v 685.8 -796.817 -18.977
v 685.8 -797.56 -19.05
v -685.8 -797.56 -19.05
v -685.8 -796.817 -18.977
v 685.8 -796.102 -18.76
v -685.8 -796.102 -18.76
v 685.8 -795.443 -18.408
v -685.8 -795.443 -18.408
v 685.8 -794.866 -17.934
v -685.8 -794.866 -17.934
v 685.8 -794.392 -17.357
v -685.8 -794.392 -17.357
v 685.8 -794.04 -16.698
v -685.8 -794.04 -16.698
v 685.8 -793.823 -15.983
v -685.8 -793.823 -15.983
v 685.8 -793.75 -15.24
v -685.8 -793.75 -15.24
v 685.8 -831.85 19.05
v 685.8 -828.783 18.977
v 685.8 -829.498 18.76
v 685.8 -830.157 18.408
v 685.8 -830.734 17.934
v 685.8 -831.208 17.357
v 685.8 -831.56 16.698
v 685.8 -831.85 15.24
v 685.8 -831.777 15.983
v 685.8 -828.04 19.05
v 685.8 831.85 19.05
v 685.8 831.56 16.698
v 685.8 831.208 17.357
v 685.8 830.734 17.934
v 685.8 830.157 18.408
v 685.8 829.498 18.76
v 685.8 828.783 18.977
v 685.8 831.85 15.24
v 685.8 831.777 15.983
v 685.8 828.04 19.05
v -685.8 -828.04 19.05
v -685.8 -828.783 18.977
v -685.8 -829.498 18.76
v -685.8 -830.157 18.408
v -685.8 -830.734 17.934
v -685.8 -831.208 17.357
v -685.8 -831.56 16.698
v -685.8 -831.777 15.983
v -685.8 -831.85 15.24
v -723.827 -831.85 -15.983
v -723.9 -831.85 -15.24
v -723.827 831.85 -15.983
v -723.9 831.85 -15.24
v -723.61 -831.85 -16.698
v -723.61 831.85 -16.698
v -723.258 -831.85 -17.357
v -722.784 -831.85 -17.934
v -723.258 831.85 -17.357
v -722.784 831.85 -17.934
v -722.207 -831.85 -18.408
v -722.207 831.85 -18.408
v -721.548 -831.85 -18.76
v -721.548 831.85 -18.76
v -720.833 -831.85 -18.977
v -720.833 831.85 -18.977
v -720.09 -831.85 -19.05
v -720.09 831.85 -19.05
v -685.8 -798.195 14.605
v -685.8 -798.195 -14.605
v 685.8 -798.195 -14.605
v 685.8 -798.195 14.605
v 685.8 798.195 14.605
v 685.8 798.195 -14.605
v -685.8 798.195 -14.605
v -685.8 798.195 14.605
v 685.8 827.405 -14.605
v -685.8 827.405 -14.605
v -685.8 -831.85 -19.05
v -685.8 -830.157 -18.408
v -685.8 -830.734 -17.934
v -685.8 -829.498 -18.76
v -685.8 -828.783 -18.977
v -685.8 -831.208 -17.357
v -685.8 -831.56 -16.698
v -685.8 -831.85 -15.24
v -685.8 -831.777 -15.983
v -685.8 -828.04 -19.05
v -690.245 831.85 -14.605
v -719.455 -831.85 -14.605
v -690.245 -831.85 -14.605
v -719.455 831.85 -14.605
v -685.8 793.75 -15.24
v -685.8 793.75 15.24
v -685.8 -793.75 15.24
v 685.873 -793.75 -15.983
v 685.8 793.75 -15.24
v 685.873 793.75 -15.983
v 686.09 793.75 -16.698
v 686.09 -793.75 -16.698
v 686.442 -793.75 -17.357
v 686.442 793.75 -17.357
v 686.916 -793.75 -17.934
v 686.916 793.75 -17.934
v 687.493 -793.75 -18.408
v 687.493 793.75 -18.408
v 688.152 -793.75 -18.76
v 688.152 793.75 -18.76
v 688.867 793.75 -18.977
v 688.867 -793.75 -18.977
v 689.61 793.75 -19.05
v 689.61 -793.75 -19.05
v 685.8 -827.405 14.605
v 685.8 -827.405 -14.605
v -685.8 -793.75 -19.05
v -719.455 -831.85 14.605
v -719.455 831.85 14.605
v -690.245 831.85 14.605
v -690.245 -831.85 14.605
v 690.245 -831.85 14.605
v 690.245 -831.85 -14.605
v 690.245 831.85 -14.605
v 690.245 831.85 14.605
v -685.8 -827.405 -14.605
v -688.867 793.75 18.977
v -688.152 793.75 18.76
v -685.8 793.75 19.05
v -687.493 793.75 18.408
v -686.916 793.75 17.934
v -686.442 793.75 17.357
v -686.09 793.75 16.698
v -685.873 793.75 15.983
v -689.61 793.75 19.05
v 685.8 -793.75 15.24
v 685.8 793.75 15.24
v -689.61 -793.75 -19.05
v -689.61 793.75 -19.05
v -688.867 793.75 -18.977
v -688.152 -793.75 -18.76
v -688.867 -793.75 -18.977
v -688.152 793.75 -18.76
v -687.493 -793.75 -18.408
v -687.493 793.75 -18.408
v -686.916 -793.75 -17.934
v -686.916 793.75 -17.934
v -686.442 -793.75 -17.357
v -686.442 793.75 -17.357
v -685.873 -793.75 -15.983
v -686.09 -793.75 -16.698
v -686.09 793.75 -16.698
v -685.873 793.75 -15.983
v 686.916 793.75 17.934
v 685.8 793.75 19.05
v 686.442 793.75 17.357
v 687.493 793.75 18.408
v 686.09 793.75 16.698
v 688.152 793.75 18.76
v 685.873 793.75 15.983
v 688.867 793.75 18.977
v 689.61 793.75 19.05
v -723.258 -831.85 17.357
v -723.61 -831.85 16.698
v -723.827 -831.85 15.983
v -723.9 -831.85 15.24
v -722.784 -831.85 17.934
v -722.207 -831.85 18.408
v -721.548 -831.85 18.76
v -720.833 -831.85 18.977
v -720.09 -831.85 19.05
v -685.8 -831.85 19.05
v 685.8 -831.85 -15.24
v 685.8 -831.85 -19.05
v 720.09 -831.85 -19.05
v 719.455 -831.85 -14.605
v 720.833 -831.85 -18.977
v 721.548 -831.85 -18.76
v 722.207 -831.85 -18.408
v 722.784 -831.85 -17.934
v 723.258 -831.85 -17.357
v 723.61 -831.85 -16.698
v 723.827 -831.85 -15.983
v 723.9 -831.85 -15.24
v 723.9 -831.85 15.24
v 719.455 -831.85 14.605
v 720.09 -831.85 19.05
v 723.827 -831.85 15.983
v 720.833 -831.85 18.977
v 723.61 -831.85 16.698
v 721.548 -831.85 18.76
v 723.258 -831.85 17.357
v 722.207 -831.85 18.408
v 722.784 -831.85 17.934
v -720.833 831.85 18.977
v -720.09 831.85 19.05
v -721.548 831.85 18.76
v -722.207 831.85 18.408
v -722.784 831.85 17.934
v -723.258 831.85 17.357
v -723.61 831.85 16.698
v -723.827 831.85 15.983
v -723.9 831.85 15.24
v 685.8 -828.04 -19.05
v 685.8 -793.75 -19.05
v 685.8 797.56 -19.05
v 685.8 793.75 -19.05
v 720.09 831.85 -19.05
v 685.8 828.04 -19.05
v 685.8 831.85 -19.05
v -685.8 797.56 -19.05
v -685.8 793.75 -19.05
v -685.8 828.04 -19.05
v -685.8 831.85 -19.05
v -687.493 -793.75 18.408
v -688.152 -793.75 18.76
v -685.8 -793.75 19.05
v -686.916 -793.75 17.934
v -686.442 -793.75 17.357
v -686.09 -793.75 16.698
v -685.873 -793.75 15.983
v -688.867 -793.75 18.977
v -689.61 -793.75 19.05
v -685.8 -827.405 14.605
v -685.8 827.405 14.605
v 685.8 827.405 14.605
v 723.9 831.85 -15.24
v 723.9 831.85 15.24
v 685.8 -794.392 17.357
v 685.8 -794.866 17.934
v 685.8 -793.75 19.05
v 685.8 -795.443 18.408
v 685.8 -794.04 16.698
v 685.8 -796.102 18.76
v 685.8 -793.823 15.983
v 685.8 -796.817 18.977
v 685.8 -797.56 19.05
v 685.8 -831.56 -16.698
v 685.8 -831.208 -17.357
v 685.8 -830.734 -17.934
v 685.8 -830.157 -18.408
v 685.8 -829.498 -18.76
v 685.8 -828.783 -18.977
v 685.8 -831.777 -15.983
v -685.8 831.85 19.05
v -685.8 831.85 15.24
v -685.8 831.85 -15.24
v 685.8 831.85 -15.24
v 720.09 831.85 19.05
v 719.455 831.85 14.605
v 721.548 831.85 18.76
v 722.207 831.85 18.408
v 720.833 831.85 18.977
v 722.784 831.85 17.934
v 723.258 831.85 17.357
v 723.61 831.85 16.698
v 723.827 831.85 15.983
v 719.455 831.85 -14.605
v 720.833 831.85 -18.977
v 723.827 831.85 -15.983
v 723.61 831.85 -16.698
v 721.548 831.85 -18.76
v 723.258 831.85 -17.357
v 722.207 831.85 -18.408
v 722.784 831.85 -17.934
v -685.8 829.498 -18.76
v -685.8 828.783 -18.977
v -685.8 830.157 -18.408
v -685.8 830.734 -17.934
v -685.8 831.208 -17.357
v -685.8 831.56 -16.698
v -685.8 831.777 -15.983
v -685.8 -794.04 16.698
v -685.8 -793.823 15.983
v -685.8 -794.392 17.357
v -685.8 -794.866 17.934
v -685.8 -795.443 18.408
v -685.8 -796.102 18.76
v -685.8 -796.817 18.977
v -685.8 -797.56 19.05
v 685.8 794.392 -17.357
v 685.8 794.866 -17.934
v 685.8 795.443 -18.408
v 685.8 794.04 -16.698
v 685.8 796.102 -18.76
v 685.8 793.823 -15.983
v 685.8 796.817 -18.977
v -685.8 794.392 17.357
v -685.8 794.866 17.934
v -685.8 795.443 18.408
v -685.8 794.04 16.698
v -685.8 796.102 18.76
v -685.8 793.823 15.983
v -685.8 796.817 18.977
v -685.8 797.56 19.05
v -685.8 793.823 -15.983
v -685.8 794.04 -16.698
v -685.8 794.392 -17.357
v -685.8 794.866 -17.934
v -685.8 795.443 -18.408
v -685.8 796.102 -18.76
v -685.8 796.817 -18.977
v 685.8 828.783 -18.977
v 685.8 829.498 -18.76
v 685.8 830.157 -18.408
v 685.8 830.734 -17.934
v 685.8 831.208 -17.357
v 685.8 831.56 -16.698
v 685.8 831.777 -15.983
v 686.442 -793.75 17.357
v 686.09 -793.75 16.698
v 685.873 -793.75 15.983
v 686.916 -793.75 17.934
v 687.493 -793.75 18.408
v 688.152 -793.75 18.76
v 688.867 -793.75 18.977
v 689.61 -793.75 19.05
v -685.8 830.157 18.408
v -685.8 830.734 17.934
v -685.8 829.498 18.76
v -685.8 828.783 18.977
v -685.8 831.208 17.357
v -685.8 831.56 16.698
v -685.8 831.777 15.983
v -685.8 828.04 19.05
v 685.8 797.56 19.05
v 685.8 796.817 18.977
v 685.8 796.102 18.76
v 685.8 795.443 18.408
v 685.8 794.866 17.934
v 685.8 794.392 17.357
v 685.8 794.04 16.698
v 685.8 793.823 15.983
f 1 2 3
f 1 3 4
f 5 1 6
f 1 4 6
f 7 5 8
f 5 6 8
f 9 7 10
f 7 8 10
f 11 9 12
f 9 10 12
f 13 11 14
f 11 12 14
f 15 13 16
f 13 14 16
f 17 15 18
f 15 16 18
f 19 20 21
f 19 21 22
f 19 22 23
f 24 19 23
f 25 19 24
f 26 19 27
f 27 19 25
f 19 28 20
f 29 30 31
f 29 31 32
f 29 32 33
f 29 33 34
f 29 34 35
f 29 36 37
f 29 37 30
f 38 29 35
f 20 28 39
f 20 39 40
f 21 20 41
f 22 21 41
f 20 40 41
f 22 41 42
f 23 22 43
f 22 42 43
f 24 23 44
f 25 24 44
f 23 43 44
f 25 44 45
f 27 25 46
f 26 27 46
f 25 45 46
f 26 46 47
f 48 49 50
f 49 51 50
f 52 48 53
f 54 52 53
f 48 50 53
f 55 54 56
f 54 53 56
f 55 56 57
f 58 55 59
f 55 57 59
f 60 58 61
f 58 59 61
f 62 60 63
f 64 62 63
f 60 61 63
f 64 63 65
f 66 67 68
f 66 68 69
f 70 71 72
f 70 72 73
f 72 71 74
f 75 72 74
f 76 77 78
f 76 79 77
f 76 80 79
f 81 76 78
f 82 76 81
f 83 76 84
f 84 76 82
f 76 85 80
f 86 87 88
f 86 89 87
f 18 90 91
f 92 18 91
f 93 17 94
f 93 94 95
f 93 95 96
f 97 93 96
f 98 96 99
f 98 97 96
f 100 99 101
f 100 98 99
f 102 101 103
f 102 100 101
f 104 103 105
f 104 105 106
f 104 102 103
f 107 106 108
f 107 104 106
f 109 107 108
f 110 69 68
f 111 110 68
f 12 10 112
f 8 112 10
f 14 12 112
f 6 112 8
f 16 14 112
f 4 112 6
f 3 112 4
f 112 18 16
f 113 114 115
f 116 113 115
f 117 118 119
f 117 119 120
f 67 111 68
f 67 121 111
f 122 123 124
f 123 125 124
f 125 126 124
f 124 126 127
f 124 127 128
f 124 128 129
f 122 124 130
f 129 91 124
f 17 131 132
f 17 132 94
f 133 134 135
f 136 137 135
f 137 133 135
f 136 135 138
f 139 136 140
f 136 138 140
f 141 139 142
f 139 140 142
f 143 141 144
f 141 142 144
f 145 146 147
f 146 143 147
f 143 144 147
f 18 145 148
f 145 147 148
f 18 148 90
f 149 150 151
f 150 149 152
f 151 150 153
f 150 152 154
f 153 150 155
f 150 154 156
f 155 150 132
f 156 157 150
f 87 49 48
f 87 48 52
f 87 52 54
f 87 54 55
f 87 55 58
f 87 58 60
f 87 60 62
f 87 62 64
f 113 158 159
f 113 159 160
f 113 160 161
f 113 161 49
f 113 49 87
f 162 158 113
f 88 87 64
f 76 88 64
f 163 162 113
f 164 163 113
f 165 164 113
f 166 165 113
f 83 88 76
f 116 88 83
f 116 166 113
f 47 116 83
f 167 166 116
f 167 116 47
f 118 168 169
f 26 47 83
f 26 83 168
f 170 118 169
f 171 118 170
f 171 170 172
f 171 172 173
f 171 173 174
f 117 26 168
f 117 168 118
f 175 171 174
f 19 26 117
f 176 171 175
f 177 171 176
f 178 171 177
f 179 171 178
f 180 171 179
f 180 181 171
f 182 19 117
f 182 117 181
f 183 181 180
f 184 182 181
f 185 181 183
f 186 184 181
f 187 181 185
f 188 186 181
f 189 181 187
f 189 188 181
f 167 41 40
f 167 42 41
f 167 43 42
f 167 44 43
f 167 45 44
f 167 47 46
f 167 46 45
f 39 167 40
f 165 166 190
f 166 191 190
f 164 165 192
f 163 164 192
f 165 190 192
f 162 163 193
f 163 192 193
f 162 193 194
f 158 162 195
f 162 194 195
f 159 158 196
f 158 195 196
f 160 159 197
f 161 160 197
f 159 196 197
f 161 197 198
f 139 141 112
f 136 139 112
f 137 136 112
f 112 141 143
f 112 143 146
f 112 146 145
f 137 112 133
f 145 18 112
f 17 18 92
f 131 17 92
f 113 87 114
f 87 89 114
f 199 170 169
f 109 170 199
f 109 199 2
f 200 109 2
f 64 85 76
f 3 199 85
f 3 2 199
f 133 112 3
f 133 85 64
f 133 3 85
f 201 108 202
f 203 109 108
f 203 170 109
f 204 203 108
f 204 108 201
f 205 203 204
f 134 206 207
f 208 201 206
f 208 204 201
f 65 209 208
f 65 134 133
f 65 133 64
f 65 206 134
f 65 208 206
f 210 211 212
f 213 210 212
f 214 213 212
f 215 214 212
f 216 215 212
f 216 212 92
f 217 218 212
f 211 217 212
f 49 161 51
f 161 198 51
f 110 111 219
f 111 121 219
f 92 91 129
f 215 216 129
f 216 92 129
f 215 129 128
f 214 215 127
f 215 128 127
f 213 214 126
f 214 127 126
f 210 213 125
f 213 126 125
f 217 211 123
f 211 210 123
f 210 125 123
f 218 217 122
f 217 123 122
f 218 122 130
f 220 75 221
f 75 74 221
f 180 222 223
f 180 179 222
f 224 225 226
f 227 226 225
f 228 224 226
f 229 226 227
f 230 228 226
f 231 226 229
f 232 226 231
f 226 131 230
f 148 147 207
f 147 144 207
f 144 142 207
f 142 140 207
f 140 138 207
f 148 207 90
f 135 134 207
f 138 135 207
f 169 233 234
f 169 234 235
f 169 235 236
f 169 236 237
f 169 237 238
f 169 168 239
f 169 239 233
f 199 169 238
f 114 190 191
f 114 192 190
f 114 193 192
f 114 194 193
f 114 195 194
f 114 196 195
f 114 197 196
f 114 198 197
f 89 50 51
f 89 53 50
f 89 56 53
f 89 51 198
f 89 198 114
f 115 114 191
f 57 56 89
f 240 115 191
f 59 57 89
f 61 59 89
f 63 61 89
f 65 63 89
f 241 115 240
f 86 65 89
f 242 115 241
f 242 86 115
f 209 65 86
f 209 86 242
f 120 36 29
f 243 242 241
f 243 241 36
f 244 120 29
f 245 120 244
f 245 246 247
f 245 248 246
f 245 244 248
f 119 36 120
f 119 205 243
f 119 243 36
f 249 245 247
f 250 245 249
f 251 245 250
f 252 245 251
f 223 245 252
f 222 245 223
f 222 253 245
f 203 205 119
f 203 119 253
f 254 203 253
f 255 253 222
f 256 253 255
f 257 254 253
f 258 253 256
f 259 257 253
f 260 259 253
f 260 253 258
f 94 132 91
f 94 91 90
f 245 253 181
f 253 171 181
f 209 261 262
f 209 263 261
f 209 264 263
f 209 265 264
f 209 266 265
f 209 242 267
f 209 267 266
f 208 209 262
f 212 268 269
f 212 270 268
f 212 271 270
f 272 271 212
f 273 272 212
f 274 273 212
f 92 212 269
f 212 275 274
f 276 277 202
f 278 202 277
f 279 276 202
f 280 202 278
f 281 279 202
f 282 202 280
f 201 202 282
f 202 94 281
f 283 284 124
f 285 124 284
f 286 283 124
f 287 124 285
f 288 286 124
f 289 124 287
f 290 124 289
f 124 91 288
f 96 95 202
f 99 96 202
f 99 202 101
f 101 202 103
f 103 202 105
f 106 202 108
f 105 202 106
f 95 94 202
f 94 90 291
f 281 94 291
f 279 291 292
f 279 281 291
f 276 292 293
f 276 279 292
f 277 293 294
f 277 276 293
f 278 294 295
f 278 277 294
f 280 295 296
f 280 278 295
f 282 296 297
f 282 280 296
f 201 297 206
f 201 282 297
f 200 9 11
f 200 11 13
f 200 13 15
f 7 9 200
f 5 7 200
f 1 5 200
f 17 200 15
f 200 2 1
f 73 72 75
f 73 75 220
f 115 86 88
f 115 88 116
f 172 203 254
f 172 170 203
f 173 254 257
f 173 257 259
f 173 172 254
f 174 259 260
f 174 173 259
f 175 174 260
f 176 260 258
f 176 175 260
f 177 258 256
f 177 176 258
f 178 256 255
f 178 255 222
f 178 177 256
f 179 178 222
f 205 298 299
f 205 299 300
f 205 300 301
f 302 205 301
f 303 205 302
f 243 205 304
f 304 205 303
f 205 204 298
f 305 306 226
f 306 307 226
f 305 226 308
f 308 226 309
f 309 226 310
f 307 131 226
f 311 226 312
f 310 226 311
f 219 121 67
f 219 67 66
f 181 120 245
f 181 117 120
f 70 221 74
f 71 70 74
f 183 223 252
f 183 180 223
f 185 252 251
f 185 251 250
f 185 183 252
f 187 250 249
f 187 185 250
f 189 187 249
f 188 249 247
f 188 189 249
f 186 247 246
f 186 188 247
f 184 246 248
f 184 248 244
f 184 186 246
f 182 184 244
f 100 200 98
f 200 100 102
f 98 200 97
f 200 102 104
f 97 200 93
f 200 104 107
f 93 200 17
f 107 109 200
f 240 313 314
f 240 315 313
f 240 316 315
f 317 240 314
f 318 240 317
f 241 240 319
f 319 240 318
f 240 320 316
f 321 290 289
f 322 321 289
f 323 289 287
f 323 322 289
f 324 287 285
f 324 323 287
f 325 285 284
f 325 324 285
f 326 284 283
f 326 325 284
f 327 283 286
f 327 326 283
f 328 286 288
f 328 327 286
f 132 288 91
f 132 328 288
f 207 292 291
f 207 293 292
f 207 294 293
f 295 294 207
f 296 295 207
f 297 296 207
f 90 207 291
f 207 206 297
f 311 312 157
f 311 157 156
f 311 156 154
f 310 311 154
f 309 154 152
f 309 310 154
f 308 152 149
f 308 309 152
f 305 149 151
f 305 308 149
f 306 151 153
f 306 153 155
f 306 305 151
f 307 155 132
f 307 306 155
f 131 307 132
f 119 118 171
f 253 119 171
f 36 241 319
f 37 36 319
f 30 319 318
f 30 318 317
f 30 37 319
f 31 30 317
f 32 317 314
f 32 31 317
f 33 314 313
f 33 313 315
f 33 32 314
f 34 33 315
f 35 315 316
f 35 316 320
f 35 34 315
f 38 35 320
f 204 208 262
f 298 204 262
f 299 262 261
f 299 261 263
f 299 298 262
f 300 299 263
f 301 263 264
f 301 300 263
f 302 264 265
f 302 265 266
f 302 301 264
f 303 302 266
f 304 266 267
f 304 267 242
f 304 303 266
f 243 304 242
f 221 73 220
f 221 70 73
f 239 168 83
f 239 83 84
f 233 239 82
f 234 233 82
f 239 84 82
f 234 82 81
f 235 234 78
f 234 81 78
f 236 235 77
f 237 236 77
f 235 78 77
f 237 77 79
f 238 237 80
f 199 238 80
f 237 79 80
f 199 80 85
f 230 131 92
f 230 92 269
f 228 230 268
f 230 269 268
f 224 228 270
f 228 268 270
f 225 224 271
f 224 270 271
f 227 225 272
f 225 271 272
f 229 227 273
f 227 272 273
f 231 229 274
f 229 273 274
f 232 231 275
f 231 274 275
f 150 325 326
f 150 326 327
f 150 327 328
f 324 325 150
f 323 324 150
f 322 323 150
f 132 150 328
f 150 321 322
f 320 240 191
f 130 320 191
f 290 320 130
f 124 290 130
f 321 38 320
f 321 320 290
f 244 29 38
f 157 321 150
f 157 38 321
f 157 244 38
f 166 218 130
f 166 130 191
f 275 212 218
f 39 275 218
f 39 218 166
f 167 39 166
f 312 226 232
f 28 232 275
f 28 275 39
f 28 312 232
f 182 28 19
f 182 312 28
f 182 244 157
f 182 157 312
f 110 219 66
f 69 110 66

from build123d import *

# Parameters (mm, degrees)
F1_W      = 29.21
F1_H      = 29.21
F2_DEPTH  = 831.85
F3_W      = 29.21
F3_H      = 29.21
F4_DEPTH  = 685.8
F7_DEPTH  = 38.1
F10_DEPTH = 38.1


with BuildPart() as f2:
    # F1 (on Front) → F2 (new body, symmetric)
    with BuildSketch(Plane.XZ):
        with BuildLine():
            ThreePointArc((-685.8, 15.24), (-686.915923, 17.934077), (-689.61, 19.05))
            Line((-689.61, 19.05), (-720.09, 19.05))
            ThreePointArc((-720.09, 19.05), (-722.784077, 17.934077), (-723.9, 15.24))
            Line((-723.9, 15.24), (-723.9, -15.24))
            ThreePointArc((-723.9, -15.24), (-722.784077, -17.934077), (-720.09, -19.05))
            Line((-720.09, -19.05), (-689.61, -19.05))
            ThreePointArc((-689.61, -19.05), (-686.915923, -17.934077), (-685.8, -15.24))
            Line((-685.8, -15.24), (-685.8, 15.24))
        make_face()
        with Locations((-704.85, 0)):
            Rectangle(F1_W, F1_H, mode=Mode.SUBTRACT)
        with BuildLine():
            ThreePointArc((723.9, 15.24), (722.784077, 17.934077), (720.09, 19.05))
            Line((720.09, 19.05), (689.61, 19.05))
            ThreePointArc((689.61, 19.05), (686.915923, 17.934077), (685.8, 15.24))
            Line((685.8, 15.24), (685.8, -15.24))
            ThreePointArc((685.8, -15.24), (686.915923, -17.934077), (689.61, -19.05))
            Line((689.61, -19.05), (720.09, -19.05))
            ThreePointArc((720.09, -19.05), (722.784077, -17.934077), (723.9, -15.24))
            Line((723.9, -15.24), (723.9, 15.24))
        make_face()
        with Locations((704.85, 0)):
            Rectangle(F1_W, F1_H, mode=Mode.SUBTRACT)
    extrude(amount=F2_DEPTH, both=True)

    # F3 (on Right) → F4 (join, symmetric)
    with BuildSketch(Plane.YZ):
        with BuildLine():
            ThreePointArc((-793.75, 15.24), (-794.865923, 17.934077), (-797.56, 19.05))
            Line((-797.56, 19.05), (-828.04, 19.05))
            ThreePointArc((-828.04, 19.05), (-830.734077, 17.934077), (-831.85, 15.24))
            Line((-831.85, 15.24), (-831.85, -15.24))
            ThreePointArc((-831.85, -15.24), (-830.734077, -17.934077), (-828.04, -19.05))
            Line((-828.04, -19.05), (-797.56, -19.05))
            ThreePointArc((-797.56, -19.05), (-794.865923, -17.934077), (-793.75, -15.24))
            Line((-793.75, -15.24), (-793.75, 15.24))
        make_face()
        with Locations((-812.8, 0)):
            Rectangle(F3_W, F3_H, mode=Mode.SUBTRACT)
        with BuildLine():
            ThreePointArc((831.85, 15.24), (830.734077, 17.934077), (828.04, 19.05))
            Line((828.04, 19.05), (797.56, 19.05))
            ThreePointArc((797.56, 19.05), (794.865923, 17.934077), (793.75, 15.24))
            Line((793.75, 15.24), (793.75, -15.24))
            ThreePointArc((793.75, -15.24), (794.865923, -17.934077), (797.56, -19.05))
            Line((797.56, -19.05), (828.04, -19.05))
            ThreePointArc((828.04, -19.05), (830.734077, -17.934077), (831.85, -15.24))
            Line((831.85, -15.24), (831.85, 15.24))
        make_face()
        with Locations((812.8, 0)):
            Rectangle(F3_W, F3_H, mode=Mode.SUBTRACT)
    extrude(amount=F4_DEPTH, both=True)

    # F6 (on offset) → F7 (join)
    with BuildSketch(Plane.XZ.offset(831.85)):
        Polygon((-685.8, 15.24), (-685.8, 19.05), (-689.61, 19.05), align=None)
        Polygon((685.8, 15.24), (689.61, 19.05), (685.8, 19.05), align=None)
        Polygon((-689.61, -19.05), (-685.8, -19.05), (-685.8, -15.24), align=None)
        Polygon((685.8, -15.24), (685.8, -19.05), (689.61, -19.05), align=None)
    extrude(amount=-F7_DEPTH)

    # F9 (on offset) → F10 (join)
    with BuildSketch(Plane(origin=(0, 831.85, 0), x_dir=(1, 0, 0), z_dir=(0, 1, 0))):
        Polygon((-685.8, 15.24), (-685.8, 19.05), (-689.61, 19.05), align=None)
        Polygon((689.61, 19.05), (685.8, 19.05), (685.8, 15.24), align=None)
        Polygon((685.8, -15.24), (685.8, -19.05), (689.61, -19.05), align=None)
        Polygon((-689.61, -19.05), (-685.8, -19.05), (-685.8, -15.24), align=None)
    extrude(amount=-F10_DEPTH)


solid = f2.part
